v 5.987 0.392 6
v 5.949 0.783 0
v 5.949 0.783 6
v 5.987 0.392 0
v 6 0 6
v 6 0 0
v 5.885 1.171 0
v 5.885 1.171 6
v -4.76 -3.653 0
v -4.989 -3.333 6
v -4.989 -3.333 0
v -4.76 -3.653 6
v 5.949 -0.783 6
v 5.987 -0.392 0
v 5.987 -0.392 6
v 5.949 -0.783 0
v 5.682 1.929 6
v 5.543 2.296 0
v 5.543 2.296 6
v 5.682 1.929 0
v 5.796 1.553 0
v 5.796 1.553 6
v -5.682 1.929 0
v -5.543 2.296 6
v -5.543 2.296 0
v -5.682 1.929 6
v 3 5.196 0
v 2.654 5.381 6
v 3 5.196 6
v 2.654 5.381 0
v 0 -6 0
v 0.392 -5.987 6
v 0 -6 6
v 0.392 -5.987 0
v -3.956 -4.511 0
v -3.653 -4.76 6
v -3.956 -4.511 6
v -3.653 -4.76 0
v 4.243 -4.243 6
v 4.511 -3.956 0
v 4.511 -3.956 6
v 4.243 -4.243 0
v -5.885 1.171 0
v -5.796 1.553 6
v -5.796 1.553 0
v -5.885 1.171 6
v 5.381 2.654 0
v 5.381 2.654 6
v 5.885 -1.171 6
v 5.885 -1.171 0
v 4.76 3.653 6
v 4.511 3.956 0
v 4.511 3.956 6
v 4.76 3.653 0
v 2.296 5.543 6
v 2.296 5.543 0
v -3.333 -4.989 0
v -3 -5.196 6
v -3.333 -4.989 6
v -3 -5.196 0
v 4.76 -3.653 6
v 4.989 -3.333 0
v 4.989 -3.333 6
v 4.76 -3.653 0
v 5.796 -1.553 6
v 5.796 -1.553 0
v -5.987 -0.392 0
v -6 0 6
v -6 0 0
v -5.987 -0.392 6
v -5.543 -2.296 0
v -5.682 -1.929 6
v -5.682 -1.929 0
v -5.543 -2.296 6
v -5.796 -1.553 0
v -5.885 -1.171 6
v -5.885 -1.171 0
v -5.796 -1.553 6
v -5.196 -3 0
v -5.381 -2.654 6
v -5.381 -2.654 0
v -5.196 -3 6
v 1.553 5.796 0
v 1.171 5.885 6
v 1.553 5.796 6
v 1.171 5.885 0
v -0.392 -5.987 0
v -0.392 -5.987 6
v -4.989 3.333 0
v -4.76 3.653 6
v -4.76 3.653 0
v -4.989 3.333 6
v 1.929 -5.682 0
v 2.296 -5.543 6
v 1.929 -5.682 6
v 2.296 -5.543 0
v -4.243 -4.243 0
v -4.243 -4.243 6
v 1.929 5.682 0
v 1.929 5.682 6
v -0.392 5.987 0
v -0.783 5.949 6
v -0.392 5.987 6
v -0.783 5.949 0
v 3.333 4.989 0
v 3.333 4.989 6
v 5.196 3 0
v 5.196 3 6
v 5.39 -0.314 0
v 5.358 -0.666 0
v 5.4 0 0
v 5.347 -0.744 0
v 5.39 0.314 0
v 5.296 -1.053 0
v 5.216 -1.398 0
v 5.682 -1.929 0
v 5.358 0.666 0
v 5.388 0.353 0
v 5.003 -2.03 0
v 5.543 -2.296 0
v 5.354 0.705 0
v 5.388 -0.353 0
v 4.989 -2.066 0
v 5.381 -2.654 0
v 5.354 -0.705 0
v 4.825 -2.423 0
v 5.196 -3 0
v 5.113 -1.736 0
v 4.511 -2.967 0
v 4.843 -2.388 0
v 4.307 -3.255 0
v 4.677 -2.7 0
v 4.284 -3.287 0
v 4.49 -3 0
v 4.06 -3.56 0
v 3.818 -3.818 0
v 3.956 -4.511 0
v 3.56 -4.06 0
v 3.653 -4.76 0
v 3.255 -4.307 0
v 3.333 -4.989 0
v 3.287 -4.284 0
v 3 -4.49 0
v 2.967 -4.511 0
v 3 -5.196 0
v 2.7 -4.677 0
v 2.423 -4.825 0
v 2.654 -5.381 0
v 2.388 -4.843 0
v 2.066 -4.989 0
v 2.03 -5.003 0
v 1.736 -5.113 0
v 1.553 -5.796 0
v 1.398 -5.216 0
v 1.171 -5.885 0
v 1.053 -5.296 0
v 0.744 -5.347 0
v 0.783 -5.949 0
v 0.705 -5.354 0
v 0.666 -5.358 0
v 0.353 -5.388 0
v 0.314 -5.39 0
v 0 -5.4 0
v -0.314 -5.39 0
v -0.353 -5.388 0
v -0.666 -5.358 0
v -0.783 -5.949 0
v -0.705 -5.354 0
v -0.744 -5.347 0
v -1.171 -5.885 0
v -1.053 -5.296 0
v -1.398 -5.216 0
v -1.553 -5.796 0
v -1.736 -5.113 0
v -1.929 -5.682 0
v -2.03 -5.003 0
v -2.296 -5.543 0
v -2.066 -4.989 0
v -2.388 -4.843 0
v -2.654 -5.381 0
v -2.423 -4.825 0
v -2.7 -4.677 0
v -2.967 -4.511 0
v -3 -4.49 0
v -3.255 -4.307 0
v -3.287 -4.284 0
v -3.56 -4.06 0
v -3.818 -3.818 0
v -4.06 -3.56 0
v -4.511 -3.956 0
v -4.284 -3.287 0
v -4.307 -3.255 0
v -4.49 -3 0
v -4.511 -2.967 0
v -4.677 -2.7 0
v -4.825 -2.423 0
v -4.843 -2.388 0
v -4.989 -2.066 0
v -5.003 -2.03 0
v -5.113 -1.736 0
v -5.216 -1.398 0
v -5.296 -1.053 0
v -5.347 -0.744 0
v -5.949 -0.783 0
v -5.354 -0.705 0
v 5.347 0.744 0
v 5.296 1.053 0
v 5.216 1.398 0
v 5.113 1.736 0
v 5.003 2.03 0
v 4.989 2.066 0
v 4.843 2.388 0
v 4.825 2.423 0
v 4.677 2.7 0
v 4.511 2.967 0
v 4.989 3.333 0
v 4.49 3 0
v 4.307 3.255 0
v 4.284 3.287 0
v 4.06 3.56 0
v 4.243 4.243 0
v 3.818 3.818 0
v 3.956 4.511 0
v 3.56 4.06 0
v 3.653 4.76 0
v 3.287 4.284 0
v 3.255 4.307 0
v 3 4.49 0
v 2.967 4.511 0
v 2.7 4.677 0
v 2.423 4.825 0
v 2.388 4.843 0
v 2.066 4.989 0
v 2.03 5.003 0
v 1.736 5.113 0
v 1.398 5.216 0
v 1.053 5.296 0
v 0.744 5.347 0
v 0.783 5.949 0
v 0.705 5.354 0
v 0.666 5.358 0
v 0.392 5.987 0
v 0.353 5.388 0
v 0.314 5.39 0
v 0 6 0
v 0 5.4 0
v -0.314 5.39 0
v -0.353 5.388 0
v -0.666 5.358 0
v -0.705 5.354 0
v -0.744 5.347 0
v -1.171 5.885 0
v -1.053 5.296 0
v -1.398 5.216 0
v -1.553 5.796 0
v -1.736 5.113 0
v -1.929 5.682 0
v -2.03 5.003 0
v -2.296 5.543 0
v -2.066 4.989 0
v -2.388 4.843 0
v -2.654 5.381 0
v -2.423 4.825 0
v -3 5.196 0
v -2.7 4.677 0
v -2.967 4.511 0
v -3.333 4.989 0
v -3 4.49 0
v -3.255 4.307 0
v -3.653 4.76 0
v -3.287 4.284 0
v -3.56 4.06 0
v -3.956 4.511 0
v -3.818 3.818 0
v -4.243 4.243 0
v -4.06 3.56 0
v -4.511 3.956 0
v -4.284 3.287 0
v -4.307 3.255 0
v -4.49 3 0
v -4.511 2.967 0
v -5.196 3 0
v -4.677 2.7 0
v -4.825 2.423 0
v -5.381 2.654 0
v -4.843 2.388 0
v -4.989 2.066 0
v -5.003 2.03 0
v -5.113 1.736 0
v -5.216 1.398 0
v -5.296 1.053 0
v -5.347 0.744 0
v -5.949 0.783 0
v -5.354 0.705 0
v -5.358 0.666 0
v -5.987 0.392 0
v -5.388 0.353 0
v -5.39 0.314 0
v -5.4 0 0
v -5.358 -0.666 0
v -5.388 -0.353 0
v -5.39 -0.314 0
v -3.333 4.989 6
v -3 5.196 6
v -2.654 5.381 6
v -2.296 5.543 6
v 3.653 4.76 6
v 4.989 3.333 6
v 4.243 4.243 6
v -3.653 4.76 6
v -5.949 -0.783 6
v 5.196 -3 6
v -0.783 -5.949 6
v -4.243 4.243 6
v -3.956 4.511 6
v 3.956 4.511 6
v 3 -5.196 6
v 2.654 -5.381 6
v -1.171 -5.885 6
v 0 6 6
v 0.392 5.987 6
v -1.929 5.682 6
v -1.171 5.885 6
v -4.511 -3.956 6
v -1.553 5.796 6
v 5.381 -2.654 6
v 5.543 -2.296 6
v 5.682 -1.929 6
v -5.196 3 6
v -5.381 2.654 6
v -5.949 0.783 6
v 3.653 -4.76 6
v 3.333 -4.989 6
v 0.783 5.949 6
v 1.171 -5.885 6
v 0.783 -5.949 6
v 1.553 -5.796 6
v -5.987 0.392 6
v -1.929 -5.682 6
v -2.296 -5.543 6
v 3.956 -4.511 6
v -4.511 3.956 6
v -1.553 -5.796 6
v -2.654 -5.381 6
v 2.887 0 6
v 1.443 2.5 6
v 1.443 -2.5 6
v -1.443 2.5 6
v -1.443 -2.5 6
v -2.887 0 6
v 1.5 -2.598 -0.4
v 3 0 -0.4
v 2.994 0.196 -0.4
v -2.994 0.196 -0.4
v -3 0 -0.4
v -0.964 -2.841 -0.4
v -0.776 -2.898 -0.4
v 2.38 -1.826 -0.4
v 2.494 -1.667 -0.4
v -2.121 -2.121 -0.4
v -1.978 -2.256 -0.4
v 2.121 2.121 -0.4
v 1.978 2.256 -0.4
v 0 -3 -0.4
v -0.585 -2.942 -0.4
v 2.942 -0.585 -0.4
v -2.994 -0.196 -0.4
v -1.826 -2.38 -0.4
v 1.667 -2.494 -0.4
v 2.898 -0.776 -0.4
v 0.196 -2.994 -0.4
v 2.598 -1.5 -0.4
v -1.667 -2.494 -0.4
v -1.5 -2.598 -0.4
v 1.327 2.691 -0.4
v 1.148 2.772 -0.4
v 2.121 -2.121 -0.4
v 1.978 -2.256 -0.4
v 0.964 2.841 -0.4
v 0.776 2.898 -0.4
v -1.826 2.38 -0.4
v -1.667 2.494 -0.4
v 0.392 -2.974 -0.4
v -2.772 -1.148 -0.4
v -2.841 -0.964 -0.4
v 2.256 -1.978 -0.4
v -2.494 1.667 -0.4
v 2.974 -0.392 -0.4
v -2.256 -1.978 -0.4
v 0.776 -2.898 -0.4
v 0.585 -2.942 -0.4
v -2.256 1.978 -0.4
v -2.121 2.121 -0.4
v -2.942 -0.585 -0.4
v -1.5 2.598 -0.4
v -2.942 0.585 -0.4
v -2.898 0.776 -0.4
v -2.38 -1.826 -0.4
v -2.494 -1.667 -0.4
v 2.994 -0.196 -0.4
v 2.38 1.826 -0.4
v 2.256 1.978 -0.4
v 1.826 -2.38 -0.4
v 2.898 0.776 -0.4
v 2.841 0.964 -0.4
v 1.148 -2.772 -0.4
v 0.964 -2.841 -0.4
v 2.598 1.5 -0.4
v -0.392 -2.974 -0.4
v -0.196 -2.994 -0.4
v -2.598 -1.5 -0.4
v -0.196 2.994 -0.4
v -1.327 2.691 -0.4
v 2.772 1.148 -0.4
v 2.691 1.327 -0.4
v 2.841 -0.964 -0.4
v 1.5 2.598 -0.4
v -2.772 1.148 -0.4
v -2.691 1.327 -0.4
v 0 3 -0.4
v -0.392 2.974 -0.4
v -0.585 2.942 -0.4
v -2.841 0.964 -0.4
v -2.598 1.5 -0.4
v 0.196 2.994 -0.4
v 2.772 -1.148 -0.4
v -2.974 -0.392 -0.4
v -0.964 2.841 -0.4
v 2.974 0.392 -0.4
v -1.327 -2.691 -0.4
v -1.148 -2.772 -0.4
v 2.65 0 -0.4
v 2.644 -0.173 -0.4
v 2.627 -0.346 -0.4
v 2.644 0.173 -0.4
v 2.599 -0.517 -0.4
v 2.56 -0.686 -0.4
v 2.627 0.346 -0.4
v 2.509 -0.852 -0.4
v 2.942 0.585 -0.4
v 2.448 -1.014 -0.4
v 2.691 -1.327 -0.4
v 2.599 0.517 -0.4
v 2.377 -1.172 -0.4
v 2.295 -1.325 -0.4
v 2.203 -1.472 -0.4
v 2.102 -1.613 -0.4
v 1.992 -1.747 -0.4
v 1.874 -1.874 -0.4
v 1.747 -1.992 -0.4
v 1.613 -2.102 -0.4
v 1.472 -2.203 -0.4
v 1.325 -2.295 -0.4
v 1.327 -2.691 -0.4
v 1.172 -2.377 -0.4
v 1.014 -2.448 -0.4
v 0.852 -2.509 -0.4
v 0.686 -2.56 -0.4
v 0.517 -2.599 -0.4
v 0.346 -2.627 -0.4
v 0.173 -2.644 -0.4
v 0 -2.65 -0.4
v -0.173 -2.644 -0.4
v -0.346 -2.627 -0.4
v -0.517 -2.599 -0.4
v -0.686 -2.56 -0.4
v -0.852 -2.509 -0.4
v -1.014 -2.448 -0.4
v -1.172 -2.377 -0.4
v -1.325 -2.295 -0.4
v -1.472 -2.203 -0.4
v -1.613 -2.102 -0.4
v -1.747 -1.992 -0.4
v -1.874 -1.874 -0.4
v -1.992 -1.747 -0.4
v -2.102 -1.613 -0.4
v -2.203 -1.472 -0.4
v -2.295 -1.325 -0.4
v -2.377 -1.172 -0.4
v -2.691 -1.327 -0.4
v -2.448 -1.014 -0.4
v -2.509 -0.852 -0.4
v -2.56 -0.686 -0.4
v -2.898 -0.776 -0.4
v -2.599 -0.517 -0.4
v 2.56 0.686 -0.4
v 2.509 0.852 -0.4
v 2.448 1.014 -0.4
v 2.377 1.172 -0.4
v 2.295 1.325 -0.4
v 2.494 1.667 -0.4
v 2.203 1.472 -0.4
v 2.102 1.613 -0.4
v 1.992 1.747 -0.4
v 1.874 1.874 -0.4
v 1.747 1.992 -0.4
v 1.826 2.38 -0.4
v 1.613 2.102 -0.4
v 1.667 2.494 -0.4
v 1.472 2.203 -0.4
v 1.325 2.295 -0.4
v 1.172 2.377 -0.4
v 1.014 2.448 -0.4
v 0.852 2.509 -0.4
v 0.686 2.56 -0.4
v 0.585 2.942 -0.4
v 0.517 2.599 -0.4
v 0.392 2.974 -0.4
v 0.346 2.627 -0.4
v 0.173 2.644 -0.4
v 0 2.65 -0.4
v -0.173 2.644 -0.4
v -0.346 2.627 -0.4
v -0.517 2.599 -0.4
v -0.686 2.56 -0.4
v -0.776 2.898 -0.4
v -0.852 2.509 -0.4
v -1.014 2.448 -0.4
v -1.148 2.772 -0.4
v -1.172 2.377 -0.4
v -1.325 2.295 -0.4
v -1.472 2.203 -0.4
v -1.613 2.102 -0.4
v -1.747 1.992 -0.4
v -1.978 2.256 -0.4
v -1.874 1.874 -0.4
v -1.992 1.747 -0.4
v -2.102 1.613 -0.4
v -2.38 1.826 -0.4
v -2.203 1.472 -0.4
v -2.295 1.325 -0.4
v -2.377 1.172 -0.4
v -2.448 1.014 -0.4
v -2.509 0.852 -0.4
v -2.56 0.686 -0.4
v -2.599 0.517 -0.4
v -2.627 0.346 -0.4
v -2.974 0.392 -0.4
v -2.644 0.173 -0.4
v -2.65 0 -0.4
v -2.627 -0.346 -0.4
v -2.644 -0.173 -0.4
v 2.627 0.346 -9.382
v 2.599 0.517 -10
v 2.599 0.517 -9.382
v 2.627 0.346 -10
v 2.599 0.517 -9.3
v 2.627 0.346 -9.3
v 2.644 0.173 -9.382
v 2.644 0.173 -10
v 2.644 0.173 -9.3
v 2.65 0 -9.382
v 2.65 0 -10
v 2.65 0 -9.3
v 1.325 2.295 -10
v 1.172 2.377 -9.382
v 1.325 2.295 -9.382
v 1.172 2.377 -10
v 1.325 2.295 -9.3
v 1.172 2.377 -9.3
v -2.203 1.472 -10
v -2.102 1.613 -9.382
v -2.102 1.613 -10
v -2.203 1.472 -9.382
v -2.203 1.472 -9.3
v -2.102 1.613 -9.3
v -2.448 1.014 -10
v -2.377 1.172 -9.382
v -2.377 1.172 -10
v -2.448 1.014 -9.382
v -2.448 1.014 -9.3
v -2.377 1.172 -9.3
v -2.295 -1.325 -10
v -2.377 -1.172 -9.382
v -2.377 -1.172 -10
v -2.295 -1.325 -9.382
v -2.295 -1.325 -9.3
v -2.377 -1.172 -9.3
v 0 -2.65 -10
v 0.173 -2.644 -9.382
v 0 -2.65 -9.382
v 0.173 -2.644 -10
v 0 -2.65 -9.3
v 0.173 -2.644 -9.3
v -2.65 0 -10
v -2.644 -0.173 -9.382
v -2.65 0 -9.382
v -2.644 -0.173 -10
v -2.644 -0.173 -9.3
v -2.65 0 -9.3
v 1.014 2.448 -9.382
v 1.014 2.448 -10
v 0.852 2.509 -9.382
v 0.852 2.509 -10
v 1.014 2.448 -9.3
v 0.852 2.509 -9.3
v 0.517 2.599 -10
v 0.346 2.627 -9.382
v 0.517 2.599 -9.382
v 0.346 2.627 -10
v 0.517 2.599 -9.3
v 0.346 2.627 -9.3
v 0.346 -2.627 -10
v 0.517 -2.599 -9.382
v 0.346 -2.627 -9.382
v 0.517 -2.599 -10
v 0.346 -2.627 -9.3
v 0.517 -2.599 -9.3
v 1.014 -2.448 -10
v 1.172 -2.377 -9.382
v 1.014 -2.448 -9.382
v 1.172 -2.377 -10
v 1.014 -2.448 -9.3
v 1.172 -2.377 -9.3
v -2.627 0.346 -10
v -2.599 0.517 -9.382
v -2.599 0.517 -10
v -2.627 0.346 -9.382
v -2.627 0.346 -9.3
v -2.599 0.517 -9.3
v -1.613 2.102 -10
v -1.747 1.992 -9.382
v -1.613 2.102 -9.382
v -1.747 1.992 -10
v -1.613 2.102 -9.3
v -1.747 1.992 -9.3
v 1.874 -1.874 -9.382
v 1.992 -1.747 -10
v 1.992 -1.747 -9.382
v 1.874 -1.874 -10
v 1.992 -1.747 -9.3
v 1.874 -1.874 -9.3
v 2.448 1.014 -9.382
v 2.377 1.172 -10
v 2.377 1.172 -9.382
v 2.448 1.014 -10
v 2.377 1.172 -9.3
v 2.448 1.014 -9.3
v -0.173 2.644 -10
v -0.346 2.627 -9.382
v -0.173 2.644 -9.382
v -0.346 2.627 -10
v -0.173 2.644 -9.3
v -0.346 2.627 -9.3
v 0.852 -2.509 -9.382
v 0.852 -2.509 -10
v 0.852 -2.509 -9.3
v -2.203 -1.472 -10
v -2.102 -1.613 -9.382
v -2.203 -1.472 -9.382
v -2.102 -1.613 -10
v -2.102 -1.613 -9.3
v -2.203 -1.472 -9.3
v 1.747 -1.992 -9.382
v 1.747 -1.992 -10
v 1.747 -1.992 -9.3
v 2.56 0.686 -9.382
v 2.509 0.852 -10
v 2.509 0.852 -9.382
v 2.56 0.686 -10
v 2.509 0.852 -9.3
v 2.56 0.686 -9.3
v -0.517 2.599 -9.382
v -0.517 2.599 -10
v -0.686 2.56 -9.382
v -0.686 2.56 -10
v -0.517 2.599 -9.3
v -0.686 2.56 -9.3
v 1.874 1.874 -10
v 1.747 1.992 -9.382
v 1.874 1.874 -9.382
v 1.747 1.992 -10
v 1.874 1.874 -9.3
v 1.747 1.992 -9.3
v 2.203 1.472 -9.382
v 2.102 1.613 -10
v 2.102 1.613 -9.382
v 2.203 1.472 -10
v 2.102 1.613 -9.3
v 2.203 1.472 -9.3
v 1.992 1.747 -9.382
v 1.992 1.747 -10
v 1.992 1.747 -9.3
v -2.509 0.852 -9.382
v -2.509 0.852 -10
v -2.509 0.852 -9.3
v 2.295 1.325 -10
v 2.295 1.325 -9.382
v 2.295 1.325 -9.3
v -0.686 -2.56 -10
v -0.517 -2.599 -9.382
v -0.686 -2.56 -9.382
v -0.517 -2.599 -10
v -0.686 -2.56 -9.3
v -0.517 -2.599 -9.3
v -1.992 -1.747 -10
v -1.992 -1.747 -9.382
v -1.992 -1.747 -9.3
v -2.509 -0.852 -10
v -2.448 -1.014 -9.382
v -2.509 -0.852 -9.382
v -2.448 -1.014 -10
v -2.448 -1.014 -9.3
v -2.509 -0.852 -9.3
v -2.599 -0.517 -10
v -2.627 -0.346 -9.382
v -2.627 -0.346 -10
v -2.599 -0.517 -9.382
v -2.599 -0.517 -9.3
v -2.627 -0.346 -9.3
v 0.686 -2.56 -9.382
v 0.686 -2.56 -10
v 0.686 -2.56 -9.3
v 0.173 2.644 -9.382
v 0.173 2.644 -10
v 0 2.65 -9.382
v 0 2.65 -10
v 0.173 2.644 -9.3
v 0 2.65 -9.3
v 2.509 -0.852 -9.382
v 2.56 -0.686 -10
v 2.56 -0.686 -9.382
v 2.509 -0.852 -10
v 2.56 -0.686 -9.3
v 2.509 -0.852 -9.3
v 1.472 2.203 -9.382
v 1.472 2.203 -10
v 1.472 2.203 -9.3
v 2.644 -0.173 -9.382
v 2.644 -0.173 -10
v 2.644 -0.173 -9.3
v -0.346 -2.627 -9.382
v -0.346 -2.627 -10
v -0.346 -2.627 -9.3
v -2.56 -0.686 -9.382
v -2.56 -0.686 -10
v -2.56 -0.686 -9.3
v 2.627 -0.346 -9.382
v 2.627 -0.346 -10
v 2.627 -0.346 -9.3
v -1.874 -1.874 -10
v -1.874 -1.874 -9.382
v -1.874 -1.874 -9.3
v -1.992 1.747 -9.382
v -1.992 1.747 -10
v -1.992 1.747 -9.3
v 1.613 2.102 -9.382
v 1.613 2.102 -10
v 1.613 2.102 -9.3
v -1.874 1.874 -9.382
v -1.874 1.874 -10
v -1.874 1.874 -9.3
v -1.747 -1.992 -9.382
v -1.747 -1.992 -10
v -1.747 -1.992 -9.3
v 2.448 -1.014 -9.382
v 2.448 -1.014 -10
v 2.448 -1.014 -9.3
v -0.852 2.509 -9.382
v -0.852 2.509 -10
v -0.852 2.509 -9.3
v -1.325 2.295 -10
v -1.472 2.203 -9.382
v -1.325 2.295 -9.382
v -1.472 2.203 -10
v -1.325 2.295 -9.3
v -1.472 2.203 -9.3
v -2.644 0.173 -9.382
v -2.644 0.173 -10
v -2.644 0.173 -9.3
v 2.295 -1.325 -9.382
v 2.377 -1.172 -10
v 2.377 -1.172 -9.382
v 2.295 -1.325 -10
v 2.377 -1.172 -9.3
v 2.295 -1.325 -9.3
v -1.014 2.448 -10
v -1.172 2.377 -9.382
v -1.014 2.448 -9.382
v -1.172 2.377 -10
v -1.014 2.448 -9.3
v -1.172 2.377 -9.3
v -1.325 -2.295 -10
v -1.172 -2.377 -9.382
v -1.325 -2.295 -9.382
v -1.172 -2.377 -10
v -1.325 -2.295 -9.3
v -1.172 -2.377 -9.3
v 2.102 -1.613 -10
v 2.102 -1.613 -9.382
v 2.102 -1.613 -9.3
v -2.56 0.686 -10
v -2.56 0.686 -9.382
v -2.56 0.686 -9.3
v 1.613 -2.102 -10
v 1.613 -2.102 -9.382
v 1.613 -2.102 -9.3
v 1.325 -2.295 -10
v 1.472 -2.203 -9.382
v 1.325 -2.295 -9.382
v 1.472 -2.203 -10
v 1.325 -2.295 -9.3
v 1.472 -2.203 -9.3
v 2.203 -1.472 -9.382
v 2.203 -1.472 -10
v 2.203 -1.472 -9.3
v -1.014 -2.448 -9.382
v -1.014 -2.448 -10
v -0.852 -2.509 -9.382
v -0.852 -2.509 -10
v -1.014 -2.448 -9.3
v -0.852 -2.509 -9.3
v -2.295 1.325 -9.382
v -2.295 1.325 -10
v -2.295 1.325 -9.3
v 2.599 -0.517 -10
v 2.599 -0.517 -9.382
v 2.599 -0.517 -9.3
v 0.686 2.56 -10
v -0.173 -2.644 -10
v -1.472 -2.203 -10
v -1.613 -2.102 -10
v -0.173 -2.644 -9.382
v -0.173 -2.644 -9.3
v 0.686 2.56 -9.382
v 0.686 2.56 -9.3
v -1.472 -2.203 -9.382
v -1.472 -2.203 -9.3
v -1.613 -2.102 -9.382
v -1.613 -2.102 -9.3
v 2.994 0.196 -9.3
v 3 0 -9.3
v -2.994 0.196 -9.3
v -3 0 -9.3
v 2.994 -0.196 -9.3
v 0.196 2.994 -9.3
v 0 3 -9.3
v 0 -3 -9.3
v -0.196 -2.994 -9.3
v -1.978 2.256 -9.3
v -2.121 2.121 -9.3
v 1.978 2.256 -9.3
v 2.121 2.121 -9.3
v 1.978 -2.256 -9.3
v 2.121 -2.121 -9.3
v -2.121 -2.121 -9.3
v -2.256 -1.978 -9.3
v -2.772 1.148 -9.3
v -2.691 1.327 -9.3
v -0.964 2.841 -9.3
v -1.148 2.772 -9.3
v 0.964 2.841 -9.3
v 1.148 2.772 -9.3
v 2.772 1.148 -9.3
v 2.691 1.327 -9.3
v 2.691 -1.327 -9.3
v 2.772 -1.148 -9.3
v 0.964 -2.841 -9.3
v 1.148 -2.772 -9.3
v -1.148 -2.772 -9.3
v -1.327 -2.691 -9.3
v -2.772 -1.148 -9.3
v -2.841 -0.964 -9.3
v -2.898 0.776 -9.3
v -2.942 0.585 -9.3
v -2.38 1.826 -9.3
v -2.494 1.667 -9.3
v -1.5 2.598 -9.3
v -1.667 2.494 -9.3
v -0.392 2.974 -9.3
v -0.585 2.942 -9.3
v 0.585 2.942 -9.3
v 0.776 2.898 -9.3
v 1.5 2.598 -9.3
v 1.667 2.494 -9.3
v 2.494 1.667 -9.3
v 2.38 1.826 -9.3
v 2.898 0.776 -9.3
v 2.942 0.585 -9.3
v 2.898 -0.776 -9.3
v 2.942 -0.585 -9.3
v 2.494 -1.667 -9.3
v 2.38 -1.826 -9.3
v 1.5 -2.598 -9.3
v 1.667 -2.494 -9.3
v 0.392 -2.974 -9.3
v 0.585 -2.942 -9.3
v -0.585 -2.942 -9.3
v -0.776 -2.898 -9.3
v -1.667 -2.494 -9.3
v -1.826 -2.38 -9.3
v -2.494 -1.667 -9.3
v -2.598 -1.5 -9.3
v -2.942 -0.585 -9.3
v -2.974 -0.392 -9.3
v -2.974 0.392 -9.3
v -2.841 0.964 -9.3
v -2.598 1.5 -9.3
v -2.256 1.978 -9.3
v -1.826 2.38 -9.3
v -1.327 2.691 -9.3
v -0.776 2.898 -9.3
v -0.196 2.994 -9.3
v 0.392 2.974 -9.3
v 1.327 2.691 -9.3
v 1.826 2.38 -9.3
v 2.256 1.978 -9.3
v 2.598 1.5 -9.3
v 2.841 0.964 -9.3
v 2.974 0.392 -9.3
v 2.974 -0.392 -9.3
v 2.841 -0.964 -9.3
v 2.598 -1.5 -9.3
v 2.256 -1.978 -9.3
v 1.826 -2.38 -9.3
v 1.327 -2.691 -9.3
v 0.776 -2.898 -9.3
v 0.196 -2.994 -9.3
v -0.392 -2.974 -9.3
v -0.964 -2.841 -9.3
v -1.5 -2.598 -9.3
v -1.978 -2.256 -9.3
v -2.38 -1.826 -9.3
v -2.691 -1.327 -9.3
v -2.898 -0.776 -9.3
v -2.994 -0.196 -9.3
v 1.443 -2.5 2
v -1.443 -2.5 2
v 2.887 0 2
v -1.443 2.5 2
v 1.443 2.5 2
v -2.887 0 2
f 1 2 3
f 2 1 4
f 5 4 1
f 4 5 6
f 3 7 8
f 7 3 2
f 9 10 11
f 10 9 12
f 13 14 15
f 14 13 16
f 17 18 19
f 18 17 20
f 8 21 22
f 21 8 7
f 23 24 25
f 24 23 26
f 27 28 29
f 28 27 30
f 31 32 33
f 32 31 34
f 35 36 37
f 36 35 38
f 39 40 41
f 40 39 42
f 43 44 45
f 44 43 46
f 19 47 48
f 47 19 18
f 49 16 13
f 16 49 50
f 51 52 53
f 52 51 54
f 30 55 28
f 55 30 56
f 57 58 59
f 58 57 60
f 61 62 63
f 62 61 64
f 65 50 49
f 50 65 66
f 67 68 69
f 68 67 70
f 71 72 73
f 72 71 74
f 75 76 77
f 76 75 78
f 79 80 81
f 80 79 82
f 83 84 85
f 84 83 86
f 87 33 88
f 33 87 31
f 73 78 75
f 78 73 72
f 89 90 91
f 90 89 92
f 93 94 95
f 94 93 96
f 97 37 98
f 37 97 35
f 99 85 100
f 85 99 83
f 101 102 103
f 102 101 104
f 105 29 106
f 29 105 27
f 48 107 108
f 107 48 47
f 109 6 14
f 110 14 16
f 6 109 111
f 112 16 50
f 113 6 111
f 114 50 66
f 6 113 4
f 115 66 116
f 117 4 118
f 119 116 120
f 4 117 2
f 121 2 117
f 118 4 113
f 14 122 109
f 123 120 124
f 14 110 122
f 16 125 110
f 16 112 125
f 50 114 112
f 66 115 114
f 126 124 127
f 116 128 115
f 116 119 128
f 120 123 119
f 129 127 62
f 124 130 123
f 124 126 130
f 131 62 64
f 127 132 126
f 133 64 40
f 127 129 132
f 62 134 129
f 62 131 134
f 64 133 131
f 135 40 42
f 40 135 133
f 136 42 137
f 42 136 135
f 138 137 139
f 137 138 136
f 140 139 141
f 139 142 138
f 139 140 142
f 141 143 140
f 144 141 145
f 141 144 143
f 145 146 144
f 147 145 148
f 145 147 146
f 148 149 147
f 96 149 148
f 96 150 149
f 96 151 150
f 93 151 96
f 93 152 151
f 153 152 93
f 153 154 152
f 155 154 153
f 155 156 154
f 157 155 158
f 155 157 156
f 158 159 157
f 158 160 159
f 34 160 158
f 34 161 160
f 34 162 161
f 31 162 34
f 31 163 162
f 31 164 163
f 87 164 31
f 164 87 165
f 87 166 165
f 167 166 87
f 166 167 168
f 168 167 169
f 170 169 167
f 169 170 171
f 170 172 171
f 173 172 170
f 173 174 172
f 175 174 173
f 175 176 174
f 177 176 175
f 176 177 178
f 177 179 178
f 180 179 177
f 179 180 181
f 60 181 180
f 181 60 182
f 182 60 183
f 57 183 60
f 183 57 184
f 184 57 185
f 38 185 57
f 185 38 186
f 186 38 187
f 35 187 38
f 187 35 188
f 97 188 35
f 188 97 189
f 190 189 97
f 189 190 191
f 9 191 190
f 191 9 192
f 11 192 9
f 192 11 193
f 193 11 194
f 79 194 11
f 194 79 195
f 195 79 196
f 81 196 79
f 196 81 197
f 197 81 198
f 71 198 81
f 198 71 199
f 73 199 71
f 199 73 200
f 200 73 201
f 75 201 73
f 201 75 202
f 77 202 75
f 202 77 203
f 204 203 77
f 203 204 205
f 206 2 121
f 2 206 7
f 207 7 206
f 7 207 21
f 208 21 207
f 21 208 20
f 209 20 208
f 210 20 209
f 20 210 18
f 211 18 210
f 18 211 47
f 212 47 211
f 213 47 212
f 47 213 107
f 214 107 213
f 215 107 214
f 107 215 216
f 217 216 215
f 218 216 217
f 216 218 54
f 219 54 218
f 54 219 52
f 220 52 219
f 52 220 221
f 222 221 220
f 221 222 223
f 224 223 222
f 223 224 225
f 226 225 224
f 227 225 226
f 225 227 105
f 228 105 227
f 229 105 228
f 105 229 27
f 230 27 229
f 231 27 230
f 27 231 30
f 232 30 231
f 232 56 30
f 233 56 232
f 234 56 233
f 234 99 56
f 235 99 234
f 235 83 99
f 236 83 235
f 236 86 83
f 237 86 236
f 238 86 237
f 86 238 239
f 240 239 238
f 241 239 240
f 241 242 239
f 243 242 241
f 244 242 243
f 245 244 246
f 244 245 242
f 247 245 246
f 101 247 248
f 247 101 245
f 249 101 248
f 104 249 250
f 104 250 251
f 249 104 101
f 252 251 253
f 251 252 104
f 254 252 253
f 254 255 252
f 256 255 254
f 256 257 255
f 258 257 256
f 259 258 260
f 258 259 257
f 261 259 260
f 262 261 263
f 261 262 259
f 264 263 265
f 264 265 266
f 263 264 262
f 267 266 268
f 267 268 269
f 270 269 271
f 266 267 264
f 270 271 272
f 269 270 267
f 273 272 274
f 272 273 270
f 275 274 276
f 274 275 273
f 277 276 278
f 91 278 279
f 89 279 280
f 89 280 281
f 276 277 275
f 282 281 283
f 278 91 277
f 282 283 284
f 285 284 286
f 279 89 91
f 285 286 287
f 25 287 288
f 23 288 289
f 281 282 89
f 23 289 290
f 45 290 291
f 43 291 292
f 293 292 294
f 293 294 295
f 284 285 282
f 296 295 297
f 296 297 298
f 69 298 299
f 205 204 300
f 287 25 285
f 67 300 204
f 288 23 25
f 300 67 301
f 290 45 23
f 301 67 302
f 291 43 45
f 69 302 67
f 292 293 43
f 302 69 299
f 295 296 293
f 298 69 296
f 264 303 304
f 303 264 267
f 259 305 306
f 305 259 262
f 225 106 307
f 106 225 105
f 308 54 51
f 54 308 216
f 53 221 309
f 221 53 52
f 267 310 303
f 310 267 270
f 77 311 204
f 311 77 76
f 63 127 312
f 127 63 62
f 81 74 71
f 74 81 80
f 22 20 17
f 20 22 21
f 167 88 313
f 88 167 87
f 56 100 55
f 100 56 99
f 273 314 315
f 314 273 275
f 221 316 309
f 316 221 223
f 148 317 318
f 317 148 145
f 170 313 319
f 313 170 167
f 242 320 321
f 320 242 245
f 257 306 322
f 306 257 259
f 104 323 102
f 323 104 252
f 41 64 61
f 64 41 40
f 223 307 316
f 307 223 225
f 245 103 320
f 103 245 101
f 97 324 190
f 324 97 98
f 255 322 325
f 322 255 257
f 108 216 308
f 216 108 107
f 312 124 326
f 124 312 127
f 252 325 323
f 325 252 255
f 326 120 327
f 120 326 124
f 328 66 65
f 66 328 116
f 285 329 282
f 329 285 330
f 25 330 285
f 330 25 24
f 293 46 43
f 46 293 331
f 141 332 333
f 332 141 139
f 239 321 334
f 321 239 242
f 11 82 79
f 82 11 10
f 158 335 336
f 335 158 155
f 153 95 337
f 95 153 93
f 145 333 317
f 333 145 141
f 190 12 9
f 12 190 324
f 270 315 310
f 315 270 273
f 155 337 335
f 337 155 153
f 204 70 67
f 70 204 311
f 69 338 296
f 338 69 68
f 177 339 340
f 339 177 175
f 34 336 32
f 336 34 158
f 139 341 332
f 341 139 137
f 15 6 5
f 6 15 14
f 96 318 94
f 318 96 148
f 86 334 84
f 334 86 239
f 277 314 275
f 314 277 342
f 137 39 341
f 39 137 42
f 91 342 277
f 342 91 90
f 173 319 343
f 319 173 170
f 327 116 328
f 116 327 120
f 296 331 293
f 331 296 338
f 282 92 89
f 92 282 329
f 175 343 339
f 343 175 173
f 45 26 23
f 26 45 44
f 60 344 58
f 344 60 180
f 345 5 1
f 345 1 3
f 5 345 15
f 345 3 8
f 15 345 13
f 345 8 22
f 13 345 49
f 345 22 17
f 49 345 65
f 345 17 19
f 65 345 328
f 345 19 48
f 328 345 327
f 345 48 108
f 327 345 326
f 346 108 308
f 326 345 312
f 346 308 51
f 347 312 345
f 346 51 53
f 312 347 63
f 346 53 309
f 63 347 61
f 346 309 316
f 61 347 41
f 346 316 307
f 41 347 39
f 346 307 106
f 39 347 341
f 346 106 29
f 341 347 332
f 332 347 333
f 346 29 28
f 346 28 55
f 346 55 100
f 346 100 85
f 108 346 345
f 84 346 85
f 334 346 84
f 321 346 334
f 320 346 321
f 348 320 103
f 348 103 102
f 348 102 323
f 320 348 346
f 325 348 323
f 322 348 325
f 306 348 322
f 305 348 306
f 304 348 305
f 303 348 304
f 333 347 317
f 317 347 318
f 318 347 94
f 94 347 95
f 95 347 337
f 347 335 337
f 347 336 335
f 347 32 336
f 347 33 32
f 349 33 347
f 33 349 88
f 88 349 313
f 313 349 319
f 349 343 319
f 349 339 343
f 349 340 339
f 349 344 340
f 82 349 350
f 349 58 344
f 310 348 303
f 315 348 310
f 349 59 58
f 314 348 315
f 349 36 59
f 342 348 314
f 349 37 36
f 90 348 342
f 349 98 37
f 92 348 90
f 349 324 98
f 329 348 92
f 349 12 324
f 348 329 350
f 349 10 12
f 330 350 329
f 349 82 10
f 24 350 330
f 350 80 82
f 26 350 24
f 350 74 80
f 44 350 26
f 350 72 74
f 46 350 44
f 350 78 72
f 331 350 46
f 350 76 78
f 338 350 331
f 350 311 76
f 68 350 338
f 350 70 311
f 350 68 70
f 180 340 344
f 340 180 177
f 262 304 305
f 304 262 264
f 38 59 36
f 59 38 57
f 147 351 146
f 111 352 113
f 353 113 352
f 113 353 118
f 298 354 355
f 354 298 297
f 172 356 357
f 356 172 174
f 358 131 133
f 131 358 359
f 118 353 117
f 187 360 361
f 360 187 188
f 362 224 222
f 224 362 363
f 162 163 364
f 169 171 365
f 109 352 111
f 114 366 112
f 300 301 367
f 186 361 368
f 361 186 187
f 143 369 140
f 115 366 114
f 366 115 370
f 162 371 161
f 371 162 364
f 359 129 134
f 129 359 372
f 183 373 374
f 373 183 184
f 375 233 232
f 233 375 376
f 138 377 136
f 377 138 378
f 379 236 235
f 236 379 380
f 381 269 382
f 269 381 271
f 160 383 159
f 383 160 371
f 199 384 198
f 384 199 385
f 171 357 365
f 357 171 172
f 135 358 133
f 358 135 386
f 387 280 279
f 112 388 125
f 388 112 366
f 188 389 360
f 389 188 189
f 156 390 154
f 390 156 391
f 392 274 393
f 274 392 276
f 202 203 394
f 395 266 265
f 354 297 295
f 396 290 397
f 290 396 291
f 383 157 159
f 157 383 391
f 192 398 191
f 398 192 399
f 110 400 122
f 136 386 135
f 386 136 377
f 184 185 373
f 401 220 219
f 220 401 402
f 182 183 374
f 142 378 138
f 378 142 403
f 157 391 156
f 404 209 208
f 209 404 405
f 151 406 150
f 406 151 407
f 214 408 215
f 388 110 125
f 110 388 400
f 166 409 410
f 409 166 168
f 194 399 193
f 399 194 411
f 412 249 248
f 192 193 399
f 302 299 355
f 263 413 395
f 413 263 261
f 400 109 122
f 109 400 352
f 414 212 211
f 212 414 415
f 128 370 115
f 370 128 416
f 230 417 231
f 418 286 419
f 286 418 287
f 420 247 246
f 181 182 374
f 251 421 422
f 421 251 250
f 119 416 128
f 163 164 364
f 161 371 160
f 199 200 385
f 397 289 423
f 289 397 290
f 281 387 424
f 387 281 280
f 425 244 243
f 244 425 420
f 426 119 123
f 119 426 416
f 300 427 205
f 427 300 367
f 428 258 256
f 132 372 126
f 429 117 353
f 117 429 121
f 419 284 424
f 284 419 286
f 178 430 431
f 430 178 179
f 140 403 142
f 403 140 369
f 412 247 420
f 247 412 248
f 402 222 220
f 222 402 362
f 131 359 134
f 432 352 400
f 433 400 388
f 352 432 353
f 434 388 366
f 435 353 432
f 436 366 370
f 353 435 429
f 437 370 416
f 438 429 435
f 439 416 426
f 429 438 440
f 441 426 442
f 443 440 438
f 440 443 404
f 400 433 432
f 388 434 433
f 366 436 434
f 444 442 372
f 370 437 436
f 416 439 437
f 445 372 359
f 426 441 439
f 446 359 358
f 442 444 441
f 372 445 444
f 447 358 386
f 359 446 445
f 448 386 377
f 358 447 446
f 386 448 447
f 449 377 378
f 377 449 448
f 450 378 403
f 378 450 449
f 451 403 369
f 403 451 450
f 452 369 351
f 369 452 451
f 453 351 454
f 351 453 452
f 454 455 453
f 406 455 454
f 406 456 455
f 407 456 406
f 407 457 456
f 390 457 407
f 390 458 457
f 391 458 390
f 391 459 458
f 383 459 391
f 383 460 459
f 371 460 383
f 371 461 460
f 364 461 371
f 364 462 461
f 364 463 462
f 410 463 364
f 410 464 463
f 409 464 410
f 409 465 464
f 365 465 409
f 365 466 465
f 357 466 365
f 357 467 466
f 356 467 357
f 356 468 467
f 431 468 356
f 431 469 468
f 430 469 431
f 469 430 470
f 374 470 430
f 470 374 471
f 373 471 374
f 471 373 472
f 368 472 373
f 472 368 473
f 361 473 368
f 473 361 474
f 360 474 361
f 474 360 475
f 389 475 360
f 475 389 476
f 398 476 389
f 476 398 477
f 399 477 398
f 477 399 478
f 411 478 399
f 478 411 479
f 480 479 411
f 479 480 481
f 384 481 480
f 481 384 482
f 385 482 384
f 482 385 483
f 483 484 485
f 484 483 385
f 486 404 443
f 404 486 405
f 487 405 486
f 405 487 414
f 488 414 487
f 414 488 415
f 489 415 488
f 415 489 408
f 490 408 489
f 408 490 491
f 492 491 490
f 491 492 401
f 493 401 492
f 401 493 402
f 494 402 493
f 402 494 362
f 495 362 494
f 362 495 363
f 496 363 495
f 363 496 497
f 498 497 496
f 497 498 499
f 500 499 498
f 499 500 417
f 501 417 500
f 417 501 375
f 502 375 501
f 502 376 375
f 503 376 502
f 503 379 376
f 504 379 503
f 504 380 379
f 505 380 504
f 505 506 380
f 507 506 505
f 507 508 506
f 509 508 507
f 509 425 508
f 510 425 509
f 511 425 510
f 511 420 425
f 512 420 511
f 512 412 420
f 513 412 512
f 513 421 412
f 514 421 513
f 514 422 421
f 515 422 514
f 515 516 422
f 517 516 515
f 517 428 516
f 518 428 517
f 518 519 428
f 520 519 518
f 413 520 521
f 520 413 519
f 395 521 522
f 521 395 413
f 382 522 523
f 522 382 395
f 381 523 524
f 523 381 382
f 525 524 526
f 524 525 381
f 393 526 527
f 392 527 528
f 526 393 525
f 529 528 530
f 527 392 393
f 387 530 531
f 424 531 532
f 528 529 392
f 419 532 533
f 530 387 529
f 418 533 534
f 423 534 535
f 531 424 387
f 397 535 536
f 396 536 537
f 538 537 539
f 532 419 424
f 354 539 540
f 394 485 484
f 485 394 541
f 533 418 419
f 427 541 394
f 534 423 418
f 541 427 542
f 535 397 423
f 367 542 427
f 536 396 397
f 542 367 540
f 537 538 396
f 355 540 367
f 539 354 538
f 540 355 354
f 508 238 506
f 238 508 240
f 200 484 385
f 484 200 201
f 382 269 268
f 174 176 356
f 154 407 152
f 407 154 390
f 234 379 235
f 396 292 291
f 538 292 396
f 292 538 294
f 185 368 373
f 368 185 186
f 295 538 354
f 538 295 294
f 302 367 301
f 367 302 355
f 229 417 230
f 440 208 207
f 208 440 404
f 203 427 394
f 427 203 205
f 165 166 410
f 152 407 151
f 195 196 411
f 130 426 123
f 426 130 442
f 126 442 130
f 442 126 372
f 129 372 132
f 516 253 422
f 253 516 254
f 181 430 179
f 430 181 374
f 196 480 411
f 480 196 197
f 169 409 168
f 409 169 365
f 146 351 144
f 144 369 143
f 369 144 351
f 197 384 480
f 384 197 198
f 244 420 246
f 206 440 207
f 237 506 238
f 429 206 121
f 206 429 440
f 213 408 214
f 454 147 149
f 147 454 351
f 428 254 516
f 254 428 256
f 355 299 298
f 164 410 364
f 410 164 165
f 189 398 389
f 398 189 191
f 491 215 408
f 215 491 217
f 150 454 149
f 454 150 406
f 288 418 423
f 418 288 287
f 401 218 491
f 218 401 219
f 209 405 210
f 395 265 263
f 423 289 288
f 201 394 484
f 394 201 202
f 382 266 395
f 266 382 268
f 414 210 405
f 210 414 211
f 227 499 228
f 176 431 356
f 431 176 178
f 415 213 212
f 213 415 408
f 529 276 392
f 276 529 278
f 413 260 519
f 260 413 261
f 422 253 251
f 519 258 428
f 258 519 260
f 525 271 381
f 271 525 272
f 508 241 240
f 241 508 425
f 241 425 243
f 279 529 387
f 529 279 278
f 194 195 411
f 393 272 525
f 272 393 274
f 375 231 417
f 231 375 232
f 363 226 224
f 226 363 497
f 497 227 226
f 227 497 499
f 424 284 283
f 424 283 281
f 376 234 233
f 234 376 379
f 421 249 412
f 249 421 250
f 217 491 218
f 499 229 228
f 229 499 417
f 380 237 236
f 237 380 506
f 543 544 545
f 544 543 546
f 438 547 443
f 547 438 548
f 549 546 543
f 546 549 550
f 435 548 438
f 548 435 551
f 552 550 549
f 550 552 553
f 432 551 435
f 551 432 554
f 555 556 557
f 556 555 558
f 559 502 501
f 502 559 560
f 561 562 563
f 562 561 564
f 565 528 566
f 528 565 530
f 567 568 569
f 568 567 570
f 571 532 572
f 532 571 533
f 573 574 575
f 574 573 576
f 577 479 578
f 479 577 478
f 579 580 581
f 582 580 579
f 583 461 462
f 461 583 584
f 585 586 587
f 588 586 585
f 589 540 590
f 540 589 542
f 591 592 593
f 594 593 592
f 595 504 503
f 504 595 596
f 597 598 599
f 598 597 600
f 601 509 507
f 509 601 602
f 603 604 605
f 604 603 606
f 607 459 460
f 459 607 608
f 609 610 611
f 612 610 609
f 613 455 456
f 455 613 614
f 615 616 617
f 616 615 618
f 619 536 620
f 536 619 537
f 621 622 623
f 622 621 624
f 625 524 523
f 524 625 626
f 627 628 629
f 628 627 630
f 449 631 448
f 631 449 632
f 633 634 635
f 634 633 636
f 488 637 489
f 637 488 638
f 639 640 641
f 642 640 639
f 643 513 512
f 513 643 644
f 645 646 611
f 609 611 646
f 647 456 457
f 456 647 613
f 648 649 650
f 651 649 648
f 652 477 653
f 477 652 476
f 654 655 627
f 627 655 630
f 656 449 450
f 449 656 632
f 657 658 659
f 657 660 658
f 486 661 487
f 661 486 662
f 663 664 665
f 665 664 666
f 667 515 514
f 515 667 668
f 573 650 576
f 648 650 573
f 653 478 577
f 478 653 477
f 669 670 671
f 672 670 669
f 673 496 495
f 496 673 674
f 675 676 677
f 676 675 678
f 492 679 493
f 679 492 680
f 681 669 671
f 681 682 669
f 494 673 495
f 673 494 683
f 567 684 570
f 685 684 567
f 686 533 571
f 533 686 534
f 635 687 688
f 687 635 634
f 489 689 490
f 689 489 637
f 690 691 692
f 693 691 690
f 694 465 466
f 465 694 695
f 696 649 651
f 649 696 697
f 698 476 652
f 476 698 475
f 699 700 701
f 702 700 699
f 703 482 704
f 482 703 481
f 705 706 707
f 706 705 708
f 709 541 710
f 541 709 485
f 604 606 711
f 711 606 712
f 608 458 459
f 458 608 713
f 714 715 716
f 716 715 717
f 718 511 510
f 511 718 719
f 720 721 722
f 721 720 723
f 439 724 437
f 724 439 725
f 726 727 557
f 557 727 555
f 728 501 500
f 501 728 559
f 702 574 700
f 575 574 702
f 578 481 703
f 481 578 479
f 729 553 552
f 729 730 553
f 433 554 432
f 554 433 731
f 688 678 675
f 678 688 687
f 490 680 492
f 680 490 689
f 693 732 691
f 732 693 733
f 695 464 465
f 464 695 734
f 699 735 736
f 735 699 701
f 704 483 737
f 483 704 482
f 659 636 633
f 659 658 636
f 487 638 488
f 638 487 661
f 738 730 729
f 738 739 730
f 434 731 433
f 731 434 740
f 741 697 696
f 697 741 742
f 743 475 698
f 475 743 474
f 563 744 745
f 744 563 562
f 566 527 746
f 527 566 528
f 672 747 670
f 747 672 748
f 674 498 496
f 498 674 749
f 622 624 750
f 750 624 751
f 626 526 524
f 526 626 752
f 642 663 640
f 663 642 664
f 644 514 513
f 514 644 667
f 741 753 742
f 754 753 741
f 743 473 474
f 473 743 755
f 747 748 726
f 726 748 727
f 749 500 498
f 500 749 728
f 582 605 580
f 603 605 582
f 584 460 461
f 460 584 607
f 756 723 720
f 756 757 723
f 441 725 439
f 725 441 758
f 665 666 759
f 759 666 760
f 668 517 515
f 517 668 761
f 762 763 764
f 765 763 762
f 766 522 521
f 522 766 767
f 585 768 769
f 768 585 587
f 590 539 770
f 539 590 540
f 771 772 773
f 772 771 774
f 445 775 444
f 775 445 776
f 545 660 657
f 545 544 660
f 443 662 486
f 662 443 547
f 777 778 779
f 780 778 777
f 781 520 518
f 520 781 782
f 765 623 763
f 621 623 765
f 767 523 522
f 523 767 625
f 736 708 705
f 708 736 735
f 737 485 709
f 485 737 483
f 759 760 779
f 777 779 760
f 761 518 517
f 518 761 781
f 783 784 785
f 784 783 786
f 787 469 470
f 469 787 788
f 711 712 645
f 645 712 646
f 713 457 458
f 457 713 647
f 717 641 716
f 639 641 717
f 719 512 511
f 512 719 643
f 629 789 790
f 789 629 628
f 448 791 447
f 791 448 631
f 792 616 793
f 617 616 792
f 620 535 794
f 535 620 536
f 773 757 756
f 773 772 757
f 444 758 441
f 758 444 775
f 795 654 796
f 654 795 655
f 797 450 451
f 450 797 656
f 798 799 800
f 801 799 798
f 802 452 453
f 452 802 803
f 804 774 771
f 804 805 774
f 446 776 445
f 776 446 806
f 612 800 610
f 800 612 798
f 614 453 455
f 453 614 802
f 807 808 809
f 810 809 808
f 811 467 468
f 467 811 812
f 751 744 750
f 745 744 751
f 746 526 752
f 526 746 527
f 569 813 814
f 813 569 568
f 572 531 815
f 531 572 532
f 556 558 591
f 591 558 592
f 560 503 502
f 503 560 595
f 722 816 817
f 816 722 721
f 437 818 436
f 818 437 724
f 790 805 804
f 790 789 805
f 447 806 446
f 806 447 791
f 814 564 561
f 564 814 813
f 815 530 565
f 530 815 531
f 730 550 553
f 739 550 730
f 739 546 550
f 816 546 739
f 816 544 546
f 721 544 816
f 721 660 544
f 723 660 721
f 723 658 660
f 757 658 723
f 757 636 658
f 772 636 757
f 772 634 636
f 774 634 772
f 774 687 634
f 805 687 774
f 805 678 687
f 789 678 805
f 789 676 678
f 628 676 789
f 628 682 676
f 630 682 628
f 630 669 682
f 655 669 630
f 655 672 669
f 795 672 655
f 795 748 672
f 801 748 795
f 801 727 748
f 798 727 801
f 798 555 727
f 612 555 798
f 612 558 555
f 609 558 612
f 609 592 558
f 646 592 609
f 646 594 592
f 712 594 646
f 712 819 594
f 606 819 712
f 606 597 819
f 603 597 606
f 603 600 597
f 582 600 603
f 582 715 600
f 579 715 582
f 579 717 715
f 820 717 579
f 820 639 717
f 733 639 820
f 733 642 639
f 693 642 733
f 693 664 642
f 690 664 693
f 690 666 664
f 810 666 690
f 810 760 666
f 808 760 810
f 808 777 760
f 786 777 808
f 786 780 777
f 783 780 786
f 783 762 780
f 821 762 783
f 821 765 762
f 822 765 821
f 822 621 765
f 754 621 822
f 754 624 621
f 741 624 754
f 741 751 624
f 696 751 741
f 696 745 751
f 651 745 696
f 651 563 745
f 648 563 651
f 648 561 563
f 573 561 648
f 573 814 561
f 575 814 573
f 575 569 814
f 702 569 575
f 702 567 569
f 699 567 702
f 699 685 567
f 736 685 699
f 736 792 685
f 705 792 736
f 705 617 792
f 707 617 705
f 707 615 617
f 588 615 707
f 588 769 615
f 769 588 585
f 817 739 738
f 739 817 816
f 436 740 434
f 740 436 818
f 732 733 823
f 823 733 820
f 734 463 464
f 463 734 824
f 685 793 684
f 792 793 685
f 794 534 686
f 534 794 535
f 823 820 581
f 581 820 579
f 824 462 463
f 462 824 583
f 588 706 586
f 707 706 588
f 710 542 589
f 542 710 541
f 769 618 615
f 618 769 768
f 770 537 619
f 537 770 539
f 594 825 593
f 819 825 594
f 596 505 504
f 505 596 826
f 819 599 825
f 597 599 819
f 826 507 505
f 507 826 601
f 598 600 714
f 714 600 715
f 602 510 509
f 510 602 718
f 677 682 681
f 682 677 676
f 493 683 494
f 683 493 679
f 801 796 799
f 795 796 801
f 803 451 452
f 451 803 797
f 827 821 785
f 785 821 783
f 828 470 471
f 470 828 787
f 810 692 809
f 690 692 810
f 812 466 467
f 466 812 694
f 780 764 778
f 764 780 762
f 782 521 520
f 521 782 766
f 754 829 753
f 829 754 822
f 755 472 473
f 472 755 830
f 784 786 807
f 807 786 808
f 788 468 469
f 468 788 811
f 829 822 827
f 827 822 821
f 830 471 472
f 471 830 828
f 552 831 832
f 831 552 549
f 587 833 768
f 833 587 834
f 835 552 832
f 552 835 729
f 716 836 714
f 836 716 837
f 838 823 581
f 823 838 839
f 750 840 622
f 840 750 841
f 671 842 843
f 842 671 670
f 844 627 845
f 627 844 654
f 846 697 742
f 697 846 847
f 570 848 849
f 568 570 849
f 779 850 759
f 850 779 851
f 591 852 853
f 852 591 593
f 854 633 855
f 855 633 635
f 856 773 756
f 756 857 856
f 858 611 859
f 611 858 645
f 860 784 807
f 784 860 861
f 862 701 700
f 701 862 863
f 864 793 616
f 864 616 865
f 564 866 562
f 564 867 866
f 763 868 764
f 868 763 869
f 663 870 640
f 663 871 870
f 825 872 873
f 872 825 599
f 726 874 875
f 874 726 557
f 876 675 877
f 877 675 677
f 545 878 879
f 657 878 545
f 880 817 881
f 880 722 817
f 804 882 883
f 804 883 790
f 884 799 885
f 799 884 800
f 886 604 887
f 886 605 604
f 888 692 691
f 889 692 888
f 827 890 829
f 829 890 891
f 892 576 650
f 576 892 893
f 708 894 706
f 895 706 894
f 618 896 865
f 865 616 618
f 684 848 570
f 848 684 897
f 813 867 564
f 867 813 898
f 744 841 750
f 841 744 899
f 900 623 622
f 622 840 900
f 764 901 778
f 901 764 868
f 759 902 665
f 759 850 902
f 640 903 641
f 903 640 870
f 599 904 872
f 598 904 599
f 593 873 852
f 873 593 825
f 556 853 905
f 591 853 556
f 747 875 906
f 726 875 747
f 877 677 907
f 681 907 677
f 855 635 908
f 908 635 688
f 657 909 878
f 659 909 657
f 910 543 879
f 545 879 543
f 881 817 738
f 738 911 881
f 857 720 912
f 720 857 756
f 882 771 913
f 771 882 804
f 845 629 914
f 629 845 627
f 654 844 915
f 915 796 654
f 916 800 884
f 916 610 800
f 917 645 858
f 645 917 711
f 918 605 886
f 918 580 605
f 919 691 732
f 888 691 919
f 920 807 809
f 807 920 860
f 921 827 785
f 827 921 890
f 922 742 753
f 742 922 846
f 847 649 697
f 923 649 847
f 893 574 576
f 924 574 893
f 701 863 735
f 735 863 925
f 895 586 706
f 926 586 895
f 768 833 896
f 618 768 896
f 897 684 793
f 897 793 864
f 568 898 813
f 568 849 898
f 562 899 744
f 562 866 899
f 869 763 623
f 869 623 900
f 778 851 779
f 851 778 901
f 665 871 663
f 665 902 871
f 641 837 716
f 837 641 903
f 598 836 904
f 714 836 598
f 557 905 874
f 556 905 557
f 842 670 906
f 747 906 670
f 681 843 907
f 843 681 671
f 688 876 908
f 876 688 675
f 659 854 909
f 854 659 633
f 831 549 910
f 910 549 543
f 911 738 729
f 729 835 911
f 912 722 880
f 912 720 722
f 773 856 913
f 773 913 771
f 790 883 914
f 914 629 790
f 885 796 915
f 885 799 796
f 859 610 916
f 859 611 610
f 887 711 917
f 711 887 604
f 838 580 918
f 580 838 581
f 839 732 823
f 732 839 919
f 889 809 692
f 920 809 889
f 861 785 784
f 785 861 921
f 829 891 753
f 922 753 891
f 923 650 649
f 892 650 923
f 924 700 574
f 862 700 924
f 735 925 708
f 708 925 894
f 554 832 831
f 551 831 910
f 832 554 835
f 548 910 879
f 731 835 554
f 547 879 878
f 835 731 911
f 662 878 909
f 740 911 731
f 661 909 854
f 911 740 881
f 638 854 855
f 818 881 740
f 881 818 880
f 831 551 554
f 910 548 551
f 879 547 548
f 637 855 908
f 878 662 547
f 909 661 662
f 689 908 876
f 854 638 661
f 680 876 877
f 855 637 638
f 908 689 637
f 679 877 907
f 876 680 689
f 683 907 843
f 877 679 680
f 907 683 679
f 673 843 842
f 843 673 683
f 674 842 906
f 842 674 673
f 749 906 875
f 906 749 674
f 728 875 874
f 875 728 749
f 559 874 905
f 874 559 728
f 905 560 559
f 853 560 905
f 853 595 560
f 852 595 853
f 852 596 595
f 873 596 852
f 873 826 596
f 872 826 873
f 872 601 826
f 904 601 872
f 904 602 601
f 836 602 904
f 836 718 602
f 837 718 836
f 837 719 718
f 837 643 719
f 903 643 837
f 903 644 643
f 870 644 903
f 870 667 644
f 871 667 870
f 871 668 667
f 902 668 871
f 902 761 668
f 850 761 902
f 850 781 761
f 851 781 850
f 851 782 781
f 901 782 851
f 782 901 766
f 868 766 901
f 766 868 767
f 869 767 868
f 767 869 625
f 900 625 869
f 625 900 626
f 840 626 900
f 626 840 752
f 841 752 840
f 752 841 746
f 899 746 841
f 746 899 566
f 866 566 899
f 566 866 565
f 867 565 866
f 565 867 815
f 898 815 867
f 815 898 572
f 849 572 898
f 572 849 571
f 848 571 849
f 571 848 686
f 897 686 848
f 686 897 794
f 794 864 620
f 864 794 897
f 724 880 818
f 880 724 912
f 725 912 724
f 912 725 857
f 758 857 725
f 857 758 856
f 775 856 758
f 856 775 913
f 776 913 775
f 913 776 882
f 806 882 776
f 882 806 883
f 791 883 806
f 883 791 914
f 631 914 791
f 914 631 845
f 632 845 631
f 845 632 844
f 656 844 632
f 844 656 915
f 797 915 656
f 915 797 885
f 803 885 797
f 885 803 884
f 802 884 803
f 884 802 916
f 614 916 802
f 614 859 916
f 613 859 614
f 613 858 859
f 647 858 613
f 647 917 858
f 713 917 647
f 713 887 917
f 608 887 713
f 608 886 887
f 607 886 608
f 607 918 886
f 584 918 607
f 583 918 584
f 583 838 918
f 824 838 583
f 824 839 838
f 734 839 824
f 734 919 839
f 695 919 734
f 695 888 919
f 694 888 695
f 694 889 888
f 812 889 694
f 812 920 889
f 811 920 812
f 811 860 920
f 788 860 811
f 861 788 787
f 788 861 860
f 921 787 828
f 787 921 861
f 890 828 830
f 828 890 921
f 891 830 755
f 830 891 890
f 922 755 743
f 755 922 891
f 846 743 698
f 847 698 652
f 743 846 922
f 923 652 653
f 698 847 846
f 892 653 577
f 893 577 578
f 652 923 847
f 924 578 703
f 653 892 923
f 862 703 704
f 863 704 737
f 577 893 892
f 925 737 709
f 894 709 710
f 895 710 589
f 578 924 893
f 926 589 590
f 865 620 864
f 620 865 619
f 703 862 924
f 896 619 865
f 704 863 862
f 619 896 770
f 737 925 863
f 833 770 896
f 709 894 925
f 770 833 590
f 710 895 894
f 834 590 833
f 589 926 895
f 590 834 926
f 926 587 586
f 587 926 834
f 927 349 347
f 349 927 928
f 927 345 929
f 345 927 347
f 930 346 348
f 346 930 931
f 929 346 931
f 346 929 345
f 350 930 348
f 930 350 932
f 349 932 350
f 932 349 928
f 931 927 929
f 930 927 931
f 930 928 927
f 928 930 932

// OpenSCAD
// Socket head cap screw: 6mm shank, 12mm head diameter, 10mm long (under head)
// One connected solid, with hex socket and simplified external threads

$fn = 96;

// Parameters (mm)
shank_diameter_mm = 6;                 // major diameter
head_diameter_mm  = 12;
length_mm         = 10;                // under-head length
head_height_mm    = 6;

hex_socket_across_flats_mm = 5;
hex_socket_depth_mm        = 4.0;

thread_pitch_mm  = 1.0;
thread_depth_mm  = 0.35;               // simplified thread height (radial)
thread_length_mm = 10;                 // threaded length (<= length_mm)

tip_chamfer_mm   = 0.6;                // small end chamfer
underhead_chamfer_mm = 0.4;            // small under-head edge break

overlap_mm = 0.10;

// Helpers
function clamp(x, a, b) = x < a ? a : (x > b ? b : x);
function hex_circumradius_from_af(af) = (af/2)/cos(30);

// 2D profile for a simple triangular thread ridge (to be twisted with linear_extrude)
// IMPORTANT: polygon is defined in XY plane where X=radius, Y=z (pitch direction)
module thread_ridge_2d(r_root, depth, pitch) {
    polygon(points=[
        [r_root,          0],
        [r_root + depth,  pitch/2],
        [r_root,          pitch]
    ]);
}

module external_thread(major_d, pitch, depth, len) {
    r_major = major_d/2;
    r_root  = r_major - depth;
    turns   = (pitch > 0) ? (len / pitch) : 0;

    union() {
        // Root cylinder ensures a continuous solid core
        cylinder(r=r_root, h=len, center=false);

        // Helical ridge: rotate the 2D profile into XZ plane before extruding along Z
        // (Without this rotation, the ridge can end up degenerate/hidden in some viewers.)
        linear_extrude(
            height=len,
            twist=turns*360,
            slices=max(ceil(turns*24), 24),
            center=false,
            convexity=10
        )
            rotate([90,0,0])  // map 2D (x=radius,y=z) into 3D (x=radius,z=z)
                thread_ridge_2d(r_root=r_root, depth=depth, pitch=pitch);
    }
}

module socket_head_cap_screw() {
    thread_len = clamp(thread_length_mm, 0, length_mm);
    plain_len  = length_mm - thread_len;

    difference() {
        union() {
            // Head: z = 0 .. head_height
            cylinder(r=head_diameter_mm/2, h=head_height_mm, center=false);

            // Under-head chamfer: z = -underhead_chamfer .. 0 (connects head to shank)
            translate([0,0,-underhead_chamfer_mm])
                cylinder(r1=shank_diameter_mm/2, r2=head_diameter_mm/2,
                         h=underhead_chamfer_mm + overlap_mm, center=false);

            // Shank/threads: z = -length .. 0 (ensure overlap into under-head chamfer)
            translate([0,0,-length_mm]) {
                // Threaded portion at the tip end: z = 0 .. thread_len (local)
                if (thread_len > 0)
                    external_thread(major_d=shank_diameter_mm,
                                    pitch=thread_pitch_mm,
                                    depth=thread_depth_mm,
                                    len=thread_len);

                // Plain shank near head: z = thread_len .. length (local)
                if (plain_len > 0)
                    translate([0,0,thread_len - overlap_mm])
                        cylinder(r=shank_diameter_mm/2,
                                 h=plain_len + overlap_mm, center=false);
            }

            // Tip chamfer at very end: z = -length .. -length+tip_chamfer
            translate([0,0,-length_mm])
                cylinder(r1=0, r2=shank_diameter_mm/2,
                         h=tip_chamfer_mm + overlap_mm, center=false);
        }

        // Hex socket recess in head (from top face down)
        translate([0,0,head_height_mm - hex_socket_depth_mm])
            cylinder(r=hex_circumradius_from_af(hex_socket_across_flats_mm),
                     h=hex_socket_depth_mm + overlap_mm,
                     center=false, $fn=6);
    }
}

socket_head_cap_screw();
